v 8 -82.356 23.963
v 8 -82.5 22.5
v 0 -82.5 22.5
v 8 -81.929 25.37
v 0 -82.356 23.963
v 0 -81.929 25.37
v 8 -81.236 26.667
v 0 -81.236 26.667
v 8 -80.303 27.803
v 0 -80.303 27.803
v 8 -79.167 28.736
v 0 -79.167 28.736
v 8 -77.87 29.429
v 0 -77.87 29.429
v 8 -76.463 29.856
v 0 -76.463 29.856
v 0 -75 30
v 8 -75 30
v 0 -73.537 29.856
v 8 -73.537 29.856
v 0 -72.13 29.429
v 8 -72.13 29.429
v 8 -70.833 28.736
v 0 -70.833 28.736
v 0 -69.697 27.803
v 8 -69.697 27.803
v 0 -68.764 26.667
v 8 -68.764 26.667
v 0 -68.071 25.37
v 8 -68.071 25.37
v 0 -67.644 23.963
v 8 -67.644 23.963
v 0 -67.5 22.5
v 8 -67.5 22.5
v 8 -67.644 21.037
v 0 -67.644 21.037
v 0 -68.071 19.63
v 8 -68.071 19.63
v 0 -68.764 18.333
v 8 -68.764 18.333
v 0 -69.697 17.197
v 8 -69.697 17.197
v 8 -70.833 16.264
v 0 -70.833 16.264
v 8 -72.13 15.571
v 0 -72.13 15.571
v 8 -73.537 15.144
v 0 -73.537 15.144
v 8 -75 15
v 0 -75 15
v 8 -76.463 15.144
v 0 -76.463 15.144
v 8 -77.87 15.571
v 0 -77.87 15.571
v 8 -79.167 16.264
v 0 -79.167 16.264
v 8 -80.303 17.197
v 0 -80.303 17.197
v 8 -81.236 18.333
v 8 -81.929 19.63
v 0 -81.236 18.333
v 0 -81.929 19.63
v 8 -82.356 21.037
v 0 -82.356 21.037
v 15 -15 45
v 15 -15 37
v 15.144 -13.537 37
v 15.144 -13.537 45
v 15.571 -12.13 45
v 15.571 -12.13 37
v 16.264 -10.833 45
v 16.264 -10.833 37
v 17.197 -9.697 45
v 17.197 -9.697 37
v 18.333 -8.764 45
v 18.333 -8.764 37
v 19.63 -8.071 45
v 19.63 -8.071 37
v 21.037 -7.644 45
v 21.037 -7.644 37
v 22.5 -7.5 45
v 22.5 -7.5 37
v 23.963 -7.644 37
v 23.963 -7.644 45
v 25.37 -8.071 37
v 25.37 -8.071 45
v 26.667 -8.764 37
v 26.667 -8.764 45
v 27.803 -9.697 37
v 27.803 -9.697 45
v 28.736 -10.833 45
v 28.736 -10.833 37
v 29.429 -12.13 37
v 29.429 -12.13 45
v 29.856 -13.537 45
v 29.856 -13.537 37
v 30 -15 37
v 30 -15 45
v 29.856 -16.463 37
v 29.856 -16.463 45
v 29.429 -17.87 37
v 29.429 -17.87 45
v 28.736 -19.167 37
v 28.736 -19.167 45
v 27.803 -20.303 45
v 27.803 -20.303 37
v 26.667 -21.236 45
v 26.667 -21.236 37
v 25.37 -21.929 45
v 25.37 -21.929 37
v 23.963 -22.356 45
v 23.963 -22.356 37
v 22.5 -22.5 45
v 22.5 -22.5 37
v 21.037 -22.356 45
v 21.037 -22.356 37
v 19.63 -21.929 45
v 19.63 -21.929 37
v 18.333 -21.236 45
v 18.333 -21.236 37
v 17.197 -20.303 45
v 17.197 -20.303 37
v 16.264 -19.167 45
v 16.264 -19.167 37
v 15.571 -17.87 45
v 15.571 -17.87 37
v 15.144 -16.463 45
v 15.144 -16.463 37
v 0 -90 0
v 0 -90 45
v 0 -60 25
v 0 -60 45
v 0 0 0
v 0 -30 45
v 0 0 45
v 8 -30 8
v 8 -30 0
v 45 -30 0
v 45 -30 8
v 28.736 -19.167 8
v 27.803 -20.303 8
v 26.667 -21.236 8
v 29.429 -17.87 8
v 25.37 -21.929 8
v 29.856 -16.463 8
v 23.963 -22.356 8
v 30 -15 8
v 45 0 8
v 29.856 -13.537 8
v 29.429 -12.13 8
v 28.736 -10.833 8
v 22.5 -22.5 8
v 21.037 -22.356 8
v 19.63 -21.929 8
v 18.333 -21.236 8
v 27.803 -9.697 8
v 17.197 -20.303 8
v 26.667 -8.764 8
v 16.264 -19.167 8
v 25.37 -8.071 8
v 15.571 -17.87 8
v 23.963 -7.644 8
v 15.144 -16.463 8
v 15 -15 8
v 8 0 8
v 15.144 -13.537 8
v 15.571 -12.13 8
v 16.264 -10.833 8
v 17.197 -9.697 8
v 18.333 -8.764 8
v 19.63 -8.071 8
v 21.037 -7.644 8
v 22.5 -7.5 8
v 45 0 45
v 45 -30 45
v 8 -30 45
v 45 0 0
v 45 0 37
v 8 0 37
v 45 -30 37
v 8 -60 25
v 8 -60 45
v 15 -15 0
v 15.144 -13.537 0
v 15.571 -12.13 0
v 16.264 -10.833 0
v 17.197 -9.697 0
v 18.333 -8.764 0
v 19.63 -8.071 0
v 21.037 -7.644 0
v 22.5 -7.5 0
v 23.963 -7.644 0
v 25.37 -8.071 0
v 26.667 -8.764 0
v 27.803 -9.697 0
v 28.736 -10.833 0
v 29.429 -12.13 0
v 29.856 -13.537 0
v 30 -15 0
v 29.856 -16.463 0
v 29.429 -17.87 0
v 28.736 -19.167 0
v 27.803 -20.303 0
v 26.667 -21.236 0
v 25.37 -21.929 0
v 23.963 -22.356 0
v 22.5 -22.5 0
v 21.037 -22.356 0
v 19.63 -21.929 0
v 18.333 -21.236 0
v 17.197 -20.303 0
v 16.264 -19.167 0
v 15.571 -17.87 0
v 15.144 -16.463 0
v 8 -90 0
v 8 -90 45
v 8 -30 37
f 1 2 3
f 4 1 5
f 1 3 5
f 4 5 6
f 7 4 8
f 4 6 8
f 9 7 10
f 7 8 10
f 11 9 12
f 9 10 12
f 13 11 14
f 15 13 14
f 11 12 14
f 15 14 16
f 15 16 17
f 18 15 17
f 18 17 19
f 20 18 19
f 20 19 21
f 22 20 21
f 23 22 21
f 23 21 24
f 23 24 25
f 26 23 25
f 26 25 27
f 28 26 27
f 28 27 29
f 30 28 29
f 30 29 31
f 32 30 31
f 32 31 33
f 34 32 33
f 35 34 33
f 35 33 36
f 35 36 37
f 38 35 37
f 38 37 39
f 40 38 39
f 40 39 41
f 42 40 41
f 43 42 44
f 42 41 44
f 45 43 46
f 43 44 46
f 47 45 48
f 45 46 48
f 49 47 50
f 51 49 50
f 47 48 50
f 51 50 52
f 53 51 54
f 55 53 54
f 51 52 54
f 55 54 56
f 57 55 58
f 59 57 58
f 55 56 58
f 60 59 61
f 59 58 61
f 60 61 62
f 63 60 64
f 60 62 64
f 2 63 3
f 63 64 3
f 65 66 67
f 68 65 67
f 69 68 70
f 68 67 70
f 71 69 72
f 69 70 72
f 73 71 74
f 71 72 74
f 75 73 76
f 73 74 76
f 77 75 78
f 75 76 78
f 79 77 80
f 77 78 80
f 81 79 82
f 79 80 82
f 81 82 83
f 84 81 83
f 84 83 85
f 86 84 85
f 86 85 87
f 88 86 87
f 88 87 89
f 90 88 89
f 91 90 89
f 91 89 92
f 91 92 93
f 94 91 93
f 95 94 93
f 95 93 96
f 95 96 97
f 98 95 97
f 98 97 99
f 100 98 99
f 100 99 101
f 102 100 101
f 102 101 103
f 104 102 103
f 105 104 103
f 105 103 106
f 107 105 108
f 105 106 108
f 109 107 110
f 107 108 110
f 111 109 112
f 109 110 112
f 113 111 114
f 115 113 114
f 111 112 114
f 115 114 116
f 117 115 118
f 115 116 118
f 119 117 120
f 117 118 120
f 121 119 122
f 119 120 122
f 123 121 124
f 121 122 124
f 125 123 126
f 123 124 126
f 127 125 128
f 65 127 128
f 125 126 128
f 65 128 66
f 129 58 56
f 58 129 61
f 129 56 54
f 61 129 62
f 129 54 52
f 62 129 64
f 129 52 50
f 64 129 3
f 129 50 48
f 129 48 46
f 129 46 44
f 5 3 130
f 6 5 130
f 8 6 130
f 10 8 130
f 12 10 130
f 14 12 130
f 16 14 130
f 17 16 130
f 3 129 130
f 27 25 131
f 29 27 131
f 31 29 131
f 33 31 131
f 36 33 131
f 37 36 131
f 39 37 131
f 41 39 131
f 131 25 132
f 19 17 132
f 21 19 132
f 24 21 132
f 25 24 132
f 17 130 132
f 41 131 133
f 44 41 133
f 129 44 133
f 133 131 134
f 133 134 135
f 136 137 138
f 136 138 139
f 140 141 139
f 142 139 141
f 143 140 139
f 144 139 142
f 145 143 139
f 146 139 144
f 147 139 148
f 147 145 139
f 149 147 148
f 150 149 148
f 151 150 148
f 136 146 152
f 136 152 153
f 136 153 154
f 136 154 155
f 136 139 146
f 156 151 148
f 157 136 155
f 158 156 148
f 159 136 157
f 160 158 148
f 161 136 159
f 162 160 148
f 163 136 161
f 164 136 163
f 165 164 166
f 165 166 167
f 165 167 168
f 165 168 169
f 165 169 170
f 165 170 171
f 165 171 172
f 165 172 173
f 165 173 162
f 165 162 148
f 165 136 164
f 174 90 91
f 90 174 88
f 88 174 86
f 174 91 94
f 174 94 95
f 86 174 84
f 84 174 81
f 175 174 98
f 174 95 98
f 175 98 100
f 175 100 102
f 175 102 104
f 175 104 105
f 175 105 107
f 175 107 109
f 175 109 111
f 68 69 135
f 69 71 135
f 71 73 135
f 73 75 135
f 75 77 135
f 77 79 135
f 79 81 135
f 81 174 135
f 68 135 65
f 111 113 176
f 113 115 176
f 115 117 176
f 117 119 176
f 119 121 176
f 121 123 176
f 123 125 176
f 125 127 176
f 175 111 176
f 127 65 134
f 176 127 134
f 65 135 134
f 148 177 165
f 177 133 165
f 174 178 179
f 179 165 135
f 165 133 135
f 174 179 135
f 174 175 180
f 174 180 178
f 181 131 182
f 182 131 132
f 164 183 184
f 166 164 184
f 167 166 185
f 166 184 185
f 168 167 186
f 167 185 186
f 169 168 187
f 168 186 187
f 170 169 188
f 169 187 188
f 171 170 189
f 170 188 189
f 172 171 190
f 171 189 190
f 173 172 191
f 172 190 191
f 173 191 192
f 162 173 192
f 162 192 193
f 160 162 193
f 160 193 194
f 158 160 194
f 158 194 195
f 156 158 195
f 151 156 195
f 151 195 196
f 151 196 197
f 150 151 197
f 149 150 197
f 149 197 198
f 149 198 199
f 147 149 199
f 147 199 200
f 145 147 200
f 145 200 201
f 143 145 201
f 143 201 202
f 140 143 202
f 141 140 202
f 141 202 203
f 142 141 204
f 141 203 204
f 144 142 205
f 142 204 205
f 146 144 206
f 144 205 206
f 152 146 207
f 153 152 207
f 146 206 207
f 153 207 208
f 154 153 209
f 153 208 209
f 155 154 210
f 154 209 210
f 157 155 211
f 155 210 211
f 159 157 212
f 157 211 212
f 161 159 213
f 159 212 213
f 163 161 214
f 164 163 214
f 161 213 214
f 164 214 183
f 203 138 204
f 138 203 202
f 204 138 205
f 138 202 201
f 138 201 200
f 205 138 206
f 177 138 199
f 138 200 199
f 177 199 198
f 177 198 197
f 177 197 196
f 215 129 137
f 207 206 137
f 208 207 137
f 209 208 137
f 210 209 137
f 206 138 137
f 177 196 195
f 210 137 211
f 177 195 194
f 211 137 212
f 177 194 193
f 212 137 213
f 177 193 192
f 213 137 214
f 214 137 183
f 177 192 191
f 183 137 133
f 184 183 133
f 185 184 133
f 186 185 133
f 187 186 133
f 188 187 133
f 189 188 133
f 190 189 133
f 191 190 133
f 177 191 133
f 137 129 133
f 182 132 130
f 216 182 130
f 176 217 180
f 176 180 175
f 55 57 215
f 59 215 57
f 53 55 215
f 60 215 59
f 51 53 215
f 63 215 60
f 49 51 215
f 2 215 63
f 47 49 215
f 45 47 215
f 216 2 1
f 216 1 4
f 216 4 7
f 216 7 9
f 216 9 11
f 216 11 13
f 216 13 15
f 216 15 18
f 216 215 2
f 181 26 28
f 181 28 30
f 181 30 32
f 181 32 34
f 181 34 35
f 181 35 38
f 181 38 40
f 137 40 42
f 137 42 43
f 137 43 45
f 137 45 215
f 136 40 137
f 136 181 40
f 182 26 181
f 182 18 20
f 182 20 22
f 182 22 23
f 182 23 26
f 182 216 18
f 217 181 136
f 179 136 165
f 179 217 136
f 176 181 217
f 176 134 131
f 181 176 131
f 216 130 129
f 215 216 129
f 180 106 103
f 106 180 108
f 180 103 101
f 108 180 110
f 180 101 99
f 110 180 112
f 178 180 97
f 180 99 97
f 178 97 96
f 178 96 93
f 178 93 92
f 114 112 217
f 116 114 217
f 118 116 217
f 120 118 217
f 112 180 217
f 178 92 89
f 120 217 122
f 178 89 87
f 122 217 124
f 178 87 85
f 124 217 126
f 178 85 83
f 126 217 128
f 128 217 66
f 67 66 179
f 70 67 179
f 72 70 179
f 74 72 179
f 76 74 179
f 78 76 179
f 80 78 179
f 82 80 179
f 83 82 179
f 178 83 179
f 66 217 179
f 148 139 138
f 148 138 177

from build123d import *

# Parameters (mm, degrees)
F1_DEPTH = 8
F2_W     = 30
F2_H     = 8
F3_DEPTH = 37
F6_D     = 15
F7_D     = 15
F7_DEPTH = 8


with BuildPart() as f1:
    # F0 (on Right) → F1 (new body)
    with BuildSketch(Plane.YZ):
        Polygon((-60, 45), (-90, 45), (-90, 0), (0, 0), (0, 45), (-30, 45), (-60, 25), align=None)
    extrude(amount=F1_DEPTH)

    # F2 (on face) → F3 (join)
    with BuildSketch(Plane.YZ.offset(8)):
        with Locations((-15, 4)):
            Rectangle(F2_W, F2_H)
        with Locations((-15, 41)):
            Rectangle(F2_W, F2_H)
    extrude(amount=F3_DEPTH)

    # F6 (through all)
    with Locations(Plane.XY.offset(45)):
        with Locations((22.5, -15)):
            Hole(F6_D / 2)

    # F7
    with Locations(Plane.YZ.offset(8)):
        with Locations((-75, 22.5)):
            Hole(F7_D / 2, depth=F7_DEPTH)


solid = f1.part
